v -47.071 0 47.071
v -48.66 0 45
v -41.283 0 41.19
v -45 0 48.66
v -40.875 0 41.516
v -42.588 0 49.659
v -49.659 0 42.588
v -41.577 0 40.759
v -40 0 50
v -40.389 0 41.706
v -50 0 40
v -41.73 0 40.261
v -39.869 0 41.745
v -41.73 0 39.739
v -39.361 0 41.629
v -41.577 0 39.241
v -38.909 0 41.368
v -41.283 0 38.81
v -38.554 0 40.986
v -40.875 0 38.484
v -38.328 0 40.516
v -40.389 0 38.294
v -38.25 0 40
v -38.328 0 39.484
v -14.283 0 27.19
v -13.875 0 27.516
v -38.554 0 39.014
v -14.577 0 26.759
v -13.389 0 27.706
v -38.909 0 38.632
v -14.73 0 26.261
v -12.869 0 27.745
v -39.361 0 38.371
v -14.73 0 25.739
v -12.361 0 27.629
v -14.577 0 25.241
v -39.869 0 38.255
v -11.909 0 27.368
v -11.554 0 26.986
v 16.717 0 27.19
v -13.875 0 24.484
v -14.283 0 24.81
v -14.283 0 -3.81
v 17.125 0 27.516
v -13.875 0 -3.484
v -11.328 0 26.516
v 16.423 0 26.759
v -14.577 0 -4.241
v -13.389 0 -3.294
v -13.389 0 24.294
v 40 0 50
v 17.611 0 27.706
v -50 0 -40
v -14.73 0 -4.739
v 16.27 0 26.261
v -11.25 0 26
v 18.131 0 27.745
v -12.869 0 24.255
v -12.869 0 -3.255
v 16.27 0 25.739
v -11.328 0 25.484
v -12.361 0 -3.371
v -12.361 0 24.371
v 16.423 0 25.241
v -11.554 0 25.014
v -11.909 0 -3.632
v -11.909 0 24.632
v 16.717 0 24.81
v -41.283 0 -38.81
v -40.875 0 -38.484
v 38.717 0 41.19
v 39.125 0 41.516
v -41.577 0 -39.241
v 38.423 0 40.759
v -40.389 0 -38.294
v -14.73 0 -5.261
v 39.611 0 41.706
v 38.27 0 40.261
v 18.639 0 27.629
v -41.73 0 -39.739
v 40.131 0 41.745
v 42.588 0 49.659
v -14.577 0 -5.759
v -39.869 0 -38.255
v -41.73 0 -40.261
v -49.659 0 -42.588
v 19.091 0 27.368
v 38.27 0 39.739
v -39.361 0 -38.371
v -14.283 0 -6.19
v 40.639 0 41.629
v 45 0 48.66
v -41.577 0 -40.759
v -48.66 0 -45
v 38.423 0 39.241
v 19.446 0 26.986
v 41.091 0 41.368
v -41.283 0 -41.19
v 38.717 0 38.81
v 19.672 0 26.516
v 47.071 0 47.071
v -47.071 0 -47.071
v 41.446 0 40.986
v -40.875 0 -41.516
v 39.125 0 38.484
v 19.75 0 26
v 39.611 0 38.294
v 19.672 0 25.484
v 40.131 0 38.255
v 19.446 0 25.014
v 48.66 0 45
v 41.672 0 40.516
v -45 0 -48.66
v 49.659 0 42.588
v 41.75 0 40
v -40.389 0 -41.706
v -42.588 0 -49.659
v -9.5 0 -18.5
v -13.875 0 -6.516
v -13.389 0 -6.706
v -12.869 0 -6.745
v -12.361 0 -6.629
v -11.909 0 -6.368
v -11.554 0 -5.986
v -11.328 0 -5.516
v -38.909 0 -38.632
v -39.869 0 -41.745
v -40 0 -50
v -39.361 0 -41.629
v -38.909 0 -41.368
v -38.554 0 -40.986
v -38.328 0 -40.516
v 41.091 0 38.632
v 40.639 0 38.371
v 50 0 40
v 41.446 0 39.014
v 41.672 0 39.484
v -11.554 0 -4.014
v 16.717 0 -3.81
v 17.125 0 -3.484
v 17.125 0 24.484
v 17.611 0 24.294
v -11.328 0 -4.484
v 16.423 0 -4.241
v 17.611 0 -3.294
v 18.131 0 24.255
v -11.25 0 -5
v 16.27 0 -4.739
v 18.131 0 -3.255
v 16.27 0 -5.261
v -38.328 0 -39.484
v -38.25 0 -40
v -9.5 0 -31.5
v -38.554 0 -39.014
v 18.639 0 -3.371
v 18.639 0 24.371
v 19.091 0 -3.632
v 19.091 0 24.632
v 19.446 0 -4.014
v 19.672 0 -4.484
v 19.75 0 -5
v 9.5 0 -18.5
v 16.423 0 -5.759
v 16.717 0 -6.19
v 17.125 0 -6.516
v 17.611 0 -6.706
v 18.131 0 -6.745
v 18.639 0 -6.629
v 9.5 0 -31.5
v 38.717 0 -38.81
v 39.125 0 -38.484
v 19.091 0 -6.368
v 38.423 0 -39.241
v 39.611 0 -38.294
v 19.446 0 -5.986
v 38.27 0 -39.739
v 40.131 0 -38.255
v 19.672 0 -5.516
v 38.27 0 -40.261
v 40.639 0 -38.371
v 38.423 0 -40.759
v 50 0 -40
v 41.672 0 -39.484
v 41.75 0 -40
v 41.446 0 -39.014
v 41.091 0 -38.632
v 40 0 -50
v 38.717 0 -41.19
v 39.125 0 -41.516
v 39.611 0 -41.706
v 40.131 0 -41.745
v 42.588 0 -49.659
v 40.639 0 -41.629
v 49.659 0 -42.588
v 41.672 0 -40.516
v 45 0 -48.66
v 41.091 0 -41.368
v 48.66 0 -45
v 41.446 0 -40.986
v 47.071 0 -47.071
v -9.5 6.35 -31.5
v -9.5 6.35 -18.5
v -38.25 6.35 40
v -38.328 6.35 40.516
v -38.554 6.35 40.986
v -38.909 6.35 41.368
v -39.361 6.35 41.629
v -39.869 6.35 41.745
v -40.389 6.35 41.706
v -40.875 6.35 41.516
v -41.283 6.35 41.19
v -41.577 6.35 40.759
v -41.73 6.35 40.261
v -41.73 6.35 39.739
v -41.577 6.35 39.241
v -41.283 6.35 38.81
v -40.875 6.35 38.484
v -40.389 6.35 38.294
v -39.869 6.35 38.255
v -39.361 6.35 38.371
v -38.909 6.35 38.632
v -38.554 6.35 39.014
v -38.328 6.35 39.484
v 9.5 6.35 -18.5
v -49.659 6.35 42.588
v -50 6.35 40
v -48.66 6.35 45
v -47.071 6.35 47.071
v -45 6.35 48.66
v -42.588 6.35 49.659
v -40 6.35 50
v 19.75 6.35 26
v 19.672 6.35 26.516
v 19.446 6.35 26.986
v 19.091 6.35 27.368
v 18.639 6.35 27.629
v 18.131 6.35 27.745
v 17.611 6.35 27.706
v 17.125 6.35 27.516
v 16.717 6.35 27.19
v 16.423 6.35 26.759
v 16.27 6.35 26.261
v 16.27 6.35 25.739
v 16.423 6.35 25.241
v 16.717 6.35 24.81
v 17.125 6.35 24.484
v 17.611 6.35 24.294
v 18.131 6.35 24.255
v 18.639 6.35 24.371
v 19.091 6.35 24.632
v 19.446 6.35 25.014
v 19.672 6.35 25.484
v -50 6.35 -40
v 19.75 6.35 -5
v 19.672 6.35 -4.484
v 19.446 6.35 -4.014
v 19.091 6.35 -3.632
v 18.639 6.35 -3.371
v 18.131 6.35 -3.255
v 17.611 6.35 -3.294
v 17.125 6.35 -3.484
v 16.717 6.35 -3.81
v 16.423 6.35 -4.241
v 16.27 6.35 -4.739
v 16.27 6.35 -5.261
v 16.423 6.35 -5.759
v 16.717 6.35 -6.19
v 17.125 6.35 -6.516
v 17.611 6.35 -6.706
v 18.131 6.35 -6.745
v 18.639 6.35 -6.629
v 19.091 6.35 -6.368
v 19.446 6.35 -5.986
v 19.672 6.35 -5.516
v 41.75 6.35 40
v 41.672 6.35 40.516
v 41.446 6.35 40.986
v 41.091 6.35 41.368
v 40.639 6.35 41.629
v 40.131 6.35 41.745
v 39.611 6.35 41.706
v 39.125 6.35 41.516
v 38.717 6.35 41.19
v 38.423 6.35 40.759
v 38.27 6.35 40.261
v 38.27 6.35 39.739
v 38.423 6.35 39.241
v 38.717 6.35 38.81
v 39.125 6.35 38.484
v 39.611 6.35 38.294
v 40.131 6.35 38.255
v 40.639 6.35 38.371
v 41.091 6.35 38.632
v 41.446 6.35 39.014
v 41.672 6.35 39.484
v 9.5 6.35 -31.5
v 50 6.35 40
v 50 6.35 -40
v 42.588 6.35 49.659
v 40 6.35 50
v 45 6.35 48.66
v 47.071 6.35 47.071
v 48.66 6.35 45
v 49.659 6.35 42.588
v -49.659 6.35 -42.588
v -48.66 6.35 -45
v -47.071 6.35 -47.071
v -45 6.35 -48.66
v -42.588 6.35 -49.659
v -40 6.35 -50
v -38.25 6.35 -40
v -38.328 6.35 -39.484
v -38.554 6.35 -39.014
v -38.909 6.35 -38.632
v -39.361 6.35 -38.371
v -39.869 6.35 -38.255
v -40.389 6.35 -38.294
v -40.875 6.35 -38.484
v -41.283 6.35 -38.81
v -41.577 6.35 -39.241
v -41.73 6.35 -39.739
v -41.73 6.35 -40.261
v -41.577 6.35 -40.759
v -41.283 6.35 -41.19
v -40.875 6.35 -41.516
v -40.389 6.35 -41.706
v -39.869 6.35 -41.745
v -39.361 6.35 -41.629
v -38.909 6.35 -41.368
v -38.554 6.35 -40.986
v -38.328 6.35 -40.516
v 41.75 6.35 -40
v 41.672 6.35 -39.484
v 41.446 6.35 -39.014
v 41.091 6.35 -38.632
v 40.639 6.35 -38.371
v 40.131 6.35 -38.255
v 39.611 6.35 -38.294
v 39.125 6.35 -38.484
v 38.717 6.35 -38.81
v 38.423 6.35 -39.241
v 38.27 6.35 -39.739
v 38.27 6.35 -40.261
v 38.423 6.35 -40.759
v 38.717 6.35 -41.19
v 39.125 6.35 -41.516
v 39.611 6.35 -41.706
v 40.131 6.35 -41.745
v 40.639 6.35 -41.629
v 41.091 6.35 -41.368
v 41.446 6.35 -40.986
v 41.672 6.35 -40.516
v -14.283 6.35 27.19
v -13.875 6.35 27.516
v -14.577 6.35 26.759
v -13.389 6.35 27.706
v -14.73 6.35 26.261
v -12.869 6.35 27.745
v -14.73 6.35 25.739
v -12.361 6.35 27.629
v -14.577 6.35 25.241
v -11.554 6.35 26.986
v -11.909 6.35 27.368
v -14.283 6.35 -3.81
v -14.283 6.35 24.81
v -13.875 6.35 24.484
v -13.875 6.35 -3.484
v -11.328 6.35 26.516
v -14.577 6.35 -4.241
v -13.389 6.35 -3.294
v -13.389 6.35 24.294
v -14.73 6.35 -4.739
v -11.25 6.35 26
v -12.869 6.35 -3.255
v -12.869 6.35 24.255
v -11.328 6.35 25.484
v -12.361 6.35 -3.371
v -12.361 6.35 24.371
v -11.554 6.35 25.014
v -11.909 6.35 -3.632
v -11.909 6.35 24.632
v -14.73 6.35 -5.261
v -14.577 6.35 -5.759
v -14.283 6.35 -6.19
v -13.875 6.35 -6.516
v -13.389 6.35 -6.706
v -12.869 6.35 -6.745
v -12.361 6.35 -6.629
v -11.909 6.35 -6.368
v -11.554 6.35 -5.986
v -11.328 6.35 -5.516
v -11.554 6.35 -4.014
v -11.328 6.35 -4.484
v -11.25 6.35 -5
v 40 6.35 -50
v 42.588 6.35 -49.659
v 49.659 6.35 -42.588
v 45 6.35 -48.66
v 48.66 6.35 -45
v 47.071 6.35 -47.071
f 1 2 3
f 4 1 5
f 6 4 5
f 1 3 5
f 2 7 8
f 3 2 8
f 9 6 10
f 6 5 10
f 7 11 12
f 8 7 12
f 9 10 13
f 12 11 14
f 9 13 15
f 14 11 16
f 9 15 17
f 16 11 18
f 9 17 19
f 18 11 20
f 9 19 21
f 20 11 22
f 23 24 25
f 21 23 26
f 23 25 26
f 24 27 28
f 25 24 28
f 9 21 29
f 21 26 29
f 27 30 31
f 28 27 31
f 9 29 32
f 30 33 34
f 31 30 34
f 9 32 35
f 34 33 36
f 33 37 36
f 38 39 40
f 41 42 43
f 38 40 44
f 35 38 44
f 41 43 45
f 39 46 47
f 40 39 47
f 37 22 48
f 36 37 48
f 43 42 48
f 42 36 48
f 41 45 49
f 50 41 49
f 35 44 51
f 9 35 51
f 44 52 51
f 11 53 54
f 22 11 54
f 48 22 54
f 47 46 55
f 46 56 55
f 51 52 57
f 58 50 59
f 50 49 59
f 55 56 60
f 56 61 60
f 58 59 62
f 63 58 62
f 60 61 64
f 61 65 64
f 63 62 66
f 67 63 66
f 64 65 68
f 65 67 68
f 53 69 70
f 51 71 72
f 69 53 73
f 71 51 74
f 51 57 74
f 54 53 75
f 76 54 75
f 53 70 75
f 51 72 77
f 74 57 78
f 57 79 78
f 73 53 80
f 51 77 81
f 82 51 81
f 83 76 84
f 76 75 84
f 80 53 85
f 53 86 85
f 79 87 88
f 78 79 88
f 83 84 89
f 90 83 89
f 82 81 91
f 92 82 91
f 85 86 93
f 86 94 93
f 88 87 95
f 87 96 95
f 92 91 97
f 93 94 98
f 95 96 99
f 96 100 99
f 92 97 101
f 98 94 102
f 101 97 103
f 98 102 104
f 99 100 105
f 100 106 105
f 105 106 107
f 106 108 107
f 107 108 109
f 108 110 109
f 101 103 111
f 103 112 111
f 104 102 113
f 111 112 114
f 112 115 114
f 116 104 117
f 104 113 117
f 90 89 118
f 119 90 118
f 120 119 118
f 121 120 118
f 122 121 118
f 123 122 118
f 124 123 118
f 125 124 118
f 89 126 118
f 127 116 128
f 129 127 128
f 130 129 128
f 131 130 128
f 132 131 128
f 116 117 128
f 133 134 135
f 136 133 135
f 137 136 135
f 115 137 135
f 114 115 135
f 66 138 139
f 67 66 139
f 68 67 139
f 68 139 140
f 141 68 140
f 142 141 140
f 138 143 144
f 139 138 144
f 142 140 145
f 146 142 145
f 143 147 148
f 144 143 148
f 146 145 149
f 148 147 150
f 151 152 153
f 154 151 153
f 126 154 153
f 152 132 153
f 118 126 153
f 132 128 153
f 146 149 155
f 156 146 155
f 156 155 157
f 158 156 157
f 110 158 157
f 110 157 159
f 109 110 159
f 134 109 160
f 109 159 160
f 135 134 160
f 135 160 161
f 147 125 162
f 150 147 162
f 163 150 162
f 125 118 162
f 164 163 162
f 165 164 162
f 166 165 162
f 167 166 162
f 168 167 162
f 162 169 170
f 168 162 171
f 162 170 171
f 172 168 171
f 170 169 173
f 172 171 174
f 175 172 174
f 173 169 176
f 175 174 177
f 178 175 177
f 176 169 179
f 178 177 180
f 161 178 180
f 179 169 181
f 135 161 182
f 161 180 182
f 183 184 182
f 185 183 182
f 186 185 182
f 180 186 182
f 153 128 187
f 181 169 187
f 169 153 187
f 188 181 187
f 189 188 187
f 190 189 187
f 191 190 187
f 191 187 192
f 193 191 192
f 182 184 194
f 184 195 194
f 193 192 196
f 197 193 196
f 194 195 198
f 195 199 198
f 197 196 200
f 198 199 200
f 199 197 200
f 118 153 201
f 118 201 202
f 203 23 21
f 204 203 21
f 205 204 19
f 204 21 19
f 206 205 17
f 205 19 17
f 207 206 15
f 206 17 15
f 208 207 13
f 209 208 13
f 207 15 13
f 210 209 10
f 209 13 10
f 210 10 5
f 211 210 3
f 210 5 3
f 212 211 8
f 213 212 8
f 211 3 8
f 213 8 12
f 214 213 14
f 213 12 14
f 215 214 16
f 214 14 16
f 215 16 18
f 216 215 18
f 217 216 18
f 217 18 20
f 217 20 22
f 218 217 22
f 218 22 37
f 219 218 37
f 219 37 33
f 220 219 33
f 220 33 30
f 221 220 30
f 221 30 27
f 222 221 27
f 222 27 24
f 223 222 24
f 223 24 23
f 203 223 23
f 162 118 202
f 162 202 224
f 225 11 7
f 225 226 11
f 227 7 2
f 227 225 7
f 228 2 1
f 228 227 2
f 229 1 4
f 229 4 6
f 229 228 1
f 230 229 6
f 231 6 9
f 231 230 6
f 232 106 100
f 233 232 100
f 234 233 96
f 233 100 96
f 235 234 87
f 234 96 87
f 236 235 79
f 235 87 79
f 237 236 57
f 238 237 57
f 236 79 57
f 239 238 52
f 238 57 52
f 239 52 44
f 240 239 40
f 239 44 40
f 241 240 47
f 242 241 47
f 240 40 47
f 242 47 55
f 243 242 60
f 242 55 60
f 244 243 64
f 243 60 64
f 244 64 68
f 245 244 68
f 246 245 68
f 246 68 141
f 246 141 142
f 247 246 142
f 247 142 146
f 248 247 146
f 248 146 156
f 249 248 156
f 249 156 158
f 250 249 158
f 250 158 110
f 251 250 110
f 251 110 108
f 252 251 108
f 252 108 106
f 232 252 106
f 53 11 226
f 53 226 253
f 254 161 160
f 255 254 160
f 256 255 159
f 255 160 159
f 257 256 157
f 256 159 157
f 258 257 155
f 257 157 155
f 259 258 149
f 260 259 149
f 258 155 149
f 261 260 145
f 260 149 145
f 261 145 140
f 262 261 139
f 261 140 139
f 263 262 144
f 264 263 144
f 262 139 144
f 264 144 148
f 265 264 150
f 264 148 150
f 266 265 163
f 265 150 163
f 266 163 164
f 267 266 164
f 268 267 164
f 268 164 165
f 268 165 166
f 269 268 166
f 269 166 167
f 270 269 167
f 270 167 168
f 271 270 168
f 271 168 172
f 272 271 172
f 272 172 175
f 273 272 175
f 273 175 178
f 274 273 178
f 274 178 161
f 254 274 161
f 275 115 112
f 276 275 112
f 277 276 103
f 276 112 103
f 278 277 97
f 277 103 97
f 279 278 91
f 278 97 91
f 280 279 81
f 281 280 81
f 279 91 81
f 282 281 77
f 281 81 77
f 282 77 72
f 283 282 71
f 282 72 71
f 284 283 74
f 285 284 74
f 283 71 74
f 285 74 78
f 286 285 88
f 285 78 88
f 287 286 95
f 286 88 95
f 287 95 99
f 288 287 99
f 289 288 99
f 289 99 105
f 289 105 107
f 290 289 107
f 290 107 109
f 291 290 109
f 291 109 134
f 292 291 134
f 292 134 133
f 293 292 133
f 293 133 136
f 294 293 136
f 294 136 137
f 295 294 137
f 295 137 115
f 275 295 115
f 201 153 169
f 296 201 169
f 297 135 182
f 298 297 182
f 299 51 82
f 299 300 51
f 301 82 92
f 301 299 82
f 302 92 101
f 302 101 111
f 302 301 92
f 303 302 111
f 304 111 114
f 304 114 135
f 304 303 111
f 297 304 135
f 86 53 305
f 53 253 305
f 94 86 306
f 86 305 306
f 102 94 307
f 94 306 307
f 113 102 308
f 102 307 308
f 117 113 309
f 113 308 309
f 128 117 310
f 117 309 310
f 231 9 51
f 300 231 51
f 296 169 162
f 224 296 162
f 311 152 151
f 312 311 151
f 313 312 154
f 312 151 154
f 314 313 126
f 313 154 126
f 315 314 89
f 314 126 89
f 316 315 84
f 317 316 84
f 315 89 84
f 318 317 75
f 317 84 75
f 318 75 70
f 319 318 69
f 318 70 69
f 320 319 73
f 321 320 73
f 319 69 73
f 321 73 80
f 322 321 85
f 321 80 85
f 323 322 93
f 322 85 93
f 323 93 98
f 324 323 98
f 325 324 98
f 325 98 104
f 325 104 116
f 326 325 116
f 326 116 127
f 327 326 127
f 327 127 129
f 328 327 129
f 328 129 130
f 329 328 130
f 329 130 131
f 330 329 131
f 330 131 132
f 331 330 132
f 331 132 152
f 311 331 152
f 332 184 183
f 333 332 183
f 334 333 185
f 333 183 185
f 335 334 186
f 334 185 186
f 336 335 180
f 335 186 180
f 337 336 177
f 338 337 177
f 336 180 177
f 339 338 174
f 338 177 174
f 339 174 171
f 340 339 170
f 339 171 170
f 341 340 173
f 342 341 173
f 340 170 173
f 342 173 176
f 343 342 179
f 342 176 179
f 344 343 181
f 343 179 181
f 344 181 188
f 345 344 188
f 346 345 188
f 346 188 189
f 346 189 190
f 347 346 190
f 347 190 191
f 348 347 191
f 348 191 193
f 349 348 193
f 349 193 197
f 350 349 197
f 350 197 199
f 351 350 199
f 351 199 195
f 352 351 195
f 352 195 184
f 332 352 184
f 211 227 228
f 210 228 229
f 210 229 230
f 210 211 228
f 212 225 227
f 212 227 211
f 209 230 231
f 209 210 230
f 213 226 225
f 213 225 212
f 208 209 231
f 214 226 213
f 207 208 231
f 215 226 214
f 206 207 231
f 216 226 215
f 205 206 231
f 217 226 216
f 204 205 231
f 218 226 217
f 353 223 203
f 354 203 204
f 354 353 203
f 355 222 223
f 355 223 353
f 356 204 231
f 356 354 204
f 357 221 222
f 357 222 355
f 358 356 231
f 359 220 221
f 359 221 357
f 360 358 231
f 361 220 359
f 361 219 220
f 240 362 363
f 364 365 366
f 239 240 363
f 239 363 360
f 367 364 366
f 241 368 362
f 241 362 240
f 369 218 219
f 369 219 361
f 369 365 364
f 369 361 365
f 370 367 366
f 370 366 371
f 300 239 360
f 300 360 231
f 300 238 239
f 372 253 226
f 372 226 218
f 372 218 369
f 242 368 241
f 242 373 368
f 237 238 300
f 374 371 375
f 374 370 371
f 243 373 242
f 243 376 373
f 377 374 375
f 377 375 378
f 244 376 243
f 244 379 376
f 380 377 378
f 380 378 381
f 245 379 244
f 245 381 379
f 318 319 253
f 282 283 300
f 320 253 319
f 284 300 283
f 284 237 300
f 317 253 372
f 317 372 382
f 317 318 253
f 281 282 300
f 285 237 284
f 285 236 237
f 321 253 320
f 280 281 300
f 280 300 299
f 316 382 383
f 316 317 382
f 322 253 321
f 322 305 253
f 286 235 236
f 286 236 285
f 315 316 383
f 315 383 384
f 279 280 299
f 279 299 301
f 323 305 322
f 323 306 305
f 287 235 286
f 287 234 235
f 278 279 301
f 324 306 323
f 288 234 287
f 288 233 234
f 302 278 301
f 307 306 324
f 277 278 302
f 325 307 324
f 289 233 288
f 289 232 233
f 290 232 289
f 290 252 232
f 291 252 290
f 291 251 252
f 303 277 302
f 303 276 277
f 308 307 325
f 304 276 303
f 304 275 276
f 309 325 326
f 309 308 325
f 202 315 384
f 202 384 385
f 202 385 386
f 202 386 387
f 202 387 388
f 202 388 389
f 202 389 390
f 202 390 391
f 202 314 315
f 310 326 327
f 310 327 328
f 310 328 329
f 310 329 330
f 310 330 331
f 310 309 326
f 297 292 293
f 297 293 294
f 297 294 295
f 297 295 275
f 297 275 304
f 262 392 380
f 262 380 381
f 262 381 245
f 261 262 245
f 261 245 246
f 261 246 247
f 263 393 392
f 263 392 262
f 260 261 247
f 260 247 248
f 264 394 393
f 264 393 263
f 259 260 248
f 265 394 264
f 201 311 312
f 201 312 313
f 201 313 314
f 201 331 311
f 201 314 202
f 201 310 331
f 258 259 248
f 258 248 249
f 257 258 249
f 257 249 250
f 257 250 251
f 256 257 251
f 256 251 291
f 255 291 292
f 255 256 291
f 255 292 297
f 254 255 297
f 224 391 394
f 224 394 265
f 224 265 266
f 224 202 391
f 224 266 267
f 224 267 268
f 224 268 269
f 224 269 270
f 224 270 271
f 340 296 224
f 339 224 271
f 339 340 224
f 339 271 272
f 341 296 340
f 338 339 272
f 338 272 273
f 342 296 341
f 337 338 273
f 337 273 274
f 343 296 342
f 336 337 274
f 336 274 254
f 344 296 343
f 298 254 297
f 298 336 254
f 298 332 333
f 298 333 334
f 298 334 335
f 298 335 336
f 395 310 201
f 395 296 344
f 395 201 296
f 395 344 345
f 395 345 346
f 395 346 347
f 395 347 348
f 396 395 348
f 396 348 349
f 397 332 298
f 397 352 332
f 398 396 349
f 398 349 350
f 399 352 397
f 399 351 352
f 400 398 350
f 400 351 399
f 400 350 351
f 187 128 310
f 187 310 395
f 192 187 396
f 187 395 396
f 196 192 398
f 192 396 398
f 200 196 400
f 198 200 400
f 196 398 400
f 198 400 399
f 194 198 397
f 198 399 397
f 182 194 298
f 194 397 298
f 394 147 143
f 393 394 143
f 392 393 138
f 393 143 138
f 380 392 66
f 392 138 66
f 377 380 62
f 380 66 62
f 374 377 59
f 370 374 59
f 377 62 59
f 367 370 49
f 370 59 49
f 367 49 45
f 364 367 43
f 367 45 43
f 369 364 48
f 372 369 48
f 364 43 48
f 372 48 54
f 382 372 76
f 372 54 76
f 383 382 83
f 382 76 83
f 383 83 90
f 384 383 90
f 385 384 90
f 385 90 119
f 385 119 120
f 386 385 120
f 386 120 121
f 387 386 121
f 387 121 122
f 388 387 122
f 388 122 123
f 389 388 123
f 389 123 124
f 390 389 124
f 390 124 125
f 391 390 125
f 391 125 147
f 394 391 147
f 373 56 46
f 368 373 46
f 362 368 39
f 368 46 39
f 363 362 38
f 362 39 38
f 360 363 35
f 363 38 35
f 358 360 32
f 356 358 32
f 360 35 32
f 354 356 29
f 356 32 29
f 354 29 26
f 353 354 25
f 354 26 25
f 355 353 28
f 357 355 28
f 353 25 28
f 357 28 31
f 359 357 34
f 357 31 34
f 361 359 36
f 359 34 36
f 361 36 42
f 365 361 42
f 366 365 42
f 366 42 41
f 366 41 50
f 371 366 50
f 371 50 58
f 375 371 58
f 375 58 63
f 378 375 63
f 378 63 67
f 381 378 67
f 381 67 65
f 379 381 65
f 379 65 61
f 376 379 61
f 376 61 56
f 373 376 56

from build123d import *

# Parameters (mm, degrees)
SKETCH2_W                 = 100
SKETCH2_H                 = 100
BOSS_EXTRUDE1_DEPTH       = 6.35
SKETCH3_R                 = 1.75
CUT_EXTRUDE1_DEPTH        = 7.35
LPATTERN1_COUNT           = 2
LPATTERN1_PITCH           = 80
LPATTERN2_COUNT           = 2
LPATTERN2_PITCH           = 80
LPATTERN2_COPY_1_SKETCH_R = 1.75
LPATTERN2_COPY_1_DEPTH    = 7.35
SKETCH8_R                 = 1.75
CUT_EXTRUDE2_DEPTH        = 7.35
LPATTERN3_COUNT           = 2
LPATTERN3_PITCH           = 31
LPATTERN4_COUNT           = 2
LPATTERN4_PITCH           = 31
LPATTERN4_COPY_1_SKETCH_R = 1.75
LPATTERN4_COPY_1_DEPTH    = 7.35
SKETCH9_W                 = 19
SKETCH9_H                 = 13
CUT_EXTRUDE3_DEPTH        = 7.35
FILLET1_R                 = 10


with BuildPart() as part:
    # Sketch2 → Boss-Extrude1 (new body)
    with BuildSketch(Plane(origin=(0, 0, 0), x_dir=(1, 0, 0), z_dir=(0, 1, 0))):
        Rectangle(SKETCH2_W, SKETCH2_H)
    extrude(amount=BOSS_EXTRUDE1_DEPTH)

    # Sketch3 → Cut-Extrude1 (cut, through all)
    with BuildSketch(Plane.XZ):
        with Locations((-40, -40)):
            Circle(SKETCH3_R)
    cut_extrude1 = extrude(amount=-CUT_EXTRUDE1_DEPTH, mode=Mode.SUBTRACT)

    # LPattern1: Cut-Extrude1 ×2
    with Locations(*[(0, 0, i * LPATTERN1_PITCH) for i in range(1, LPATTERN1_COUNT)]):
        add(cut_extrude1, mode=Mode.SUBTRACT)

    # LPattern2: Cut-Extrude1 ×2
    with Locations(*[(i * LPATTERN2_PITCH, 0, 0) for i in range(1, LPATTERN2_COUNT)]):
        add(cut_extrude1, mode=Mode.SUBTRACT)

    # LPattern2 copy 1 sketch → LPattern2 copy 1 (cut, through all)
    with BuildSketch(Plane(origin=(80, 0, 80), x_dir=(1, 0, 0), z_dir=(0, -1, 0))):
        with Locations((-40, -40)):
            Circle(LPATTERN2_COPY_1_SKETCH_R)
    extrude(amount=-LPATTERN2_COPY_1_DEPTH, mode=Mode.SUBTRACT)

    # Sketch8 → Cut-Extrude2 (cut, through all)
    with BuildSketch(Plane.XZ):
        with Locations((18, -5)):
            Circle(SKETCH8_R)
    cut_extrude2 = extrude(amount=-CUT_EXTRUDE2_DEPTH, mode=Mode.SUBTRACT)

    # LPattern3: Cut-Extrude2 ×2
    with Locations(*[(0, 0, i * LPATTERN3_PITCH) for i in range(1, LPATTERN3_COUNT)]):
        add(cut_extrude2, mode=Mode.SUBTRACT)

    # LPattern4: Cut-Extrude2 ×2
    with Locations(*[(-i * LPATTERN4_PITCH, 0, 0) for i in range(1, LPATTERN4_COUNT)]):
        add(cut_extrude2, mode=Mode.SUBTRACT)

    # LPattern4 copy 1 sketch → LPattern4 copy 1 (cut, through all)
    with BuildSketch(Plane(origin=(-31, 0, 31), x_dir=(1, 0, 0), z_dir=(0, -1, 0))):
        with Locations((18, -5)):
            Circle(LPATTERN4_COPY_1_SKETCH_R)
    extrude(amount=-LPATTERN4_COPY_1_DEPTH, mode=Mode.SUBTRACT)

    # Sketch9 → Cut-Extrude3 (cut, through all)
    with BuildSketch(Plane.XZ):
        with Locations((0, -25)):
            Rectangle(SKETCH9_W, SKETCH9_H)
    extrude(amount=-CUT_EXTRUDE3_DEPTH, mode=Mode.SUBTRACT)

    # Fillet1
    fillet1_edges = [part.edges().sort_by_distance(p)[0] for p in [
        (-50, 3.175, -50),
        (-50, 3.175, 50),
        (50, 3.175, 50),
        (50, 3.175, -50),
    ]]
    fillet(fillet1_edges, radius=FILLET1_R)


solid = part.part
